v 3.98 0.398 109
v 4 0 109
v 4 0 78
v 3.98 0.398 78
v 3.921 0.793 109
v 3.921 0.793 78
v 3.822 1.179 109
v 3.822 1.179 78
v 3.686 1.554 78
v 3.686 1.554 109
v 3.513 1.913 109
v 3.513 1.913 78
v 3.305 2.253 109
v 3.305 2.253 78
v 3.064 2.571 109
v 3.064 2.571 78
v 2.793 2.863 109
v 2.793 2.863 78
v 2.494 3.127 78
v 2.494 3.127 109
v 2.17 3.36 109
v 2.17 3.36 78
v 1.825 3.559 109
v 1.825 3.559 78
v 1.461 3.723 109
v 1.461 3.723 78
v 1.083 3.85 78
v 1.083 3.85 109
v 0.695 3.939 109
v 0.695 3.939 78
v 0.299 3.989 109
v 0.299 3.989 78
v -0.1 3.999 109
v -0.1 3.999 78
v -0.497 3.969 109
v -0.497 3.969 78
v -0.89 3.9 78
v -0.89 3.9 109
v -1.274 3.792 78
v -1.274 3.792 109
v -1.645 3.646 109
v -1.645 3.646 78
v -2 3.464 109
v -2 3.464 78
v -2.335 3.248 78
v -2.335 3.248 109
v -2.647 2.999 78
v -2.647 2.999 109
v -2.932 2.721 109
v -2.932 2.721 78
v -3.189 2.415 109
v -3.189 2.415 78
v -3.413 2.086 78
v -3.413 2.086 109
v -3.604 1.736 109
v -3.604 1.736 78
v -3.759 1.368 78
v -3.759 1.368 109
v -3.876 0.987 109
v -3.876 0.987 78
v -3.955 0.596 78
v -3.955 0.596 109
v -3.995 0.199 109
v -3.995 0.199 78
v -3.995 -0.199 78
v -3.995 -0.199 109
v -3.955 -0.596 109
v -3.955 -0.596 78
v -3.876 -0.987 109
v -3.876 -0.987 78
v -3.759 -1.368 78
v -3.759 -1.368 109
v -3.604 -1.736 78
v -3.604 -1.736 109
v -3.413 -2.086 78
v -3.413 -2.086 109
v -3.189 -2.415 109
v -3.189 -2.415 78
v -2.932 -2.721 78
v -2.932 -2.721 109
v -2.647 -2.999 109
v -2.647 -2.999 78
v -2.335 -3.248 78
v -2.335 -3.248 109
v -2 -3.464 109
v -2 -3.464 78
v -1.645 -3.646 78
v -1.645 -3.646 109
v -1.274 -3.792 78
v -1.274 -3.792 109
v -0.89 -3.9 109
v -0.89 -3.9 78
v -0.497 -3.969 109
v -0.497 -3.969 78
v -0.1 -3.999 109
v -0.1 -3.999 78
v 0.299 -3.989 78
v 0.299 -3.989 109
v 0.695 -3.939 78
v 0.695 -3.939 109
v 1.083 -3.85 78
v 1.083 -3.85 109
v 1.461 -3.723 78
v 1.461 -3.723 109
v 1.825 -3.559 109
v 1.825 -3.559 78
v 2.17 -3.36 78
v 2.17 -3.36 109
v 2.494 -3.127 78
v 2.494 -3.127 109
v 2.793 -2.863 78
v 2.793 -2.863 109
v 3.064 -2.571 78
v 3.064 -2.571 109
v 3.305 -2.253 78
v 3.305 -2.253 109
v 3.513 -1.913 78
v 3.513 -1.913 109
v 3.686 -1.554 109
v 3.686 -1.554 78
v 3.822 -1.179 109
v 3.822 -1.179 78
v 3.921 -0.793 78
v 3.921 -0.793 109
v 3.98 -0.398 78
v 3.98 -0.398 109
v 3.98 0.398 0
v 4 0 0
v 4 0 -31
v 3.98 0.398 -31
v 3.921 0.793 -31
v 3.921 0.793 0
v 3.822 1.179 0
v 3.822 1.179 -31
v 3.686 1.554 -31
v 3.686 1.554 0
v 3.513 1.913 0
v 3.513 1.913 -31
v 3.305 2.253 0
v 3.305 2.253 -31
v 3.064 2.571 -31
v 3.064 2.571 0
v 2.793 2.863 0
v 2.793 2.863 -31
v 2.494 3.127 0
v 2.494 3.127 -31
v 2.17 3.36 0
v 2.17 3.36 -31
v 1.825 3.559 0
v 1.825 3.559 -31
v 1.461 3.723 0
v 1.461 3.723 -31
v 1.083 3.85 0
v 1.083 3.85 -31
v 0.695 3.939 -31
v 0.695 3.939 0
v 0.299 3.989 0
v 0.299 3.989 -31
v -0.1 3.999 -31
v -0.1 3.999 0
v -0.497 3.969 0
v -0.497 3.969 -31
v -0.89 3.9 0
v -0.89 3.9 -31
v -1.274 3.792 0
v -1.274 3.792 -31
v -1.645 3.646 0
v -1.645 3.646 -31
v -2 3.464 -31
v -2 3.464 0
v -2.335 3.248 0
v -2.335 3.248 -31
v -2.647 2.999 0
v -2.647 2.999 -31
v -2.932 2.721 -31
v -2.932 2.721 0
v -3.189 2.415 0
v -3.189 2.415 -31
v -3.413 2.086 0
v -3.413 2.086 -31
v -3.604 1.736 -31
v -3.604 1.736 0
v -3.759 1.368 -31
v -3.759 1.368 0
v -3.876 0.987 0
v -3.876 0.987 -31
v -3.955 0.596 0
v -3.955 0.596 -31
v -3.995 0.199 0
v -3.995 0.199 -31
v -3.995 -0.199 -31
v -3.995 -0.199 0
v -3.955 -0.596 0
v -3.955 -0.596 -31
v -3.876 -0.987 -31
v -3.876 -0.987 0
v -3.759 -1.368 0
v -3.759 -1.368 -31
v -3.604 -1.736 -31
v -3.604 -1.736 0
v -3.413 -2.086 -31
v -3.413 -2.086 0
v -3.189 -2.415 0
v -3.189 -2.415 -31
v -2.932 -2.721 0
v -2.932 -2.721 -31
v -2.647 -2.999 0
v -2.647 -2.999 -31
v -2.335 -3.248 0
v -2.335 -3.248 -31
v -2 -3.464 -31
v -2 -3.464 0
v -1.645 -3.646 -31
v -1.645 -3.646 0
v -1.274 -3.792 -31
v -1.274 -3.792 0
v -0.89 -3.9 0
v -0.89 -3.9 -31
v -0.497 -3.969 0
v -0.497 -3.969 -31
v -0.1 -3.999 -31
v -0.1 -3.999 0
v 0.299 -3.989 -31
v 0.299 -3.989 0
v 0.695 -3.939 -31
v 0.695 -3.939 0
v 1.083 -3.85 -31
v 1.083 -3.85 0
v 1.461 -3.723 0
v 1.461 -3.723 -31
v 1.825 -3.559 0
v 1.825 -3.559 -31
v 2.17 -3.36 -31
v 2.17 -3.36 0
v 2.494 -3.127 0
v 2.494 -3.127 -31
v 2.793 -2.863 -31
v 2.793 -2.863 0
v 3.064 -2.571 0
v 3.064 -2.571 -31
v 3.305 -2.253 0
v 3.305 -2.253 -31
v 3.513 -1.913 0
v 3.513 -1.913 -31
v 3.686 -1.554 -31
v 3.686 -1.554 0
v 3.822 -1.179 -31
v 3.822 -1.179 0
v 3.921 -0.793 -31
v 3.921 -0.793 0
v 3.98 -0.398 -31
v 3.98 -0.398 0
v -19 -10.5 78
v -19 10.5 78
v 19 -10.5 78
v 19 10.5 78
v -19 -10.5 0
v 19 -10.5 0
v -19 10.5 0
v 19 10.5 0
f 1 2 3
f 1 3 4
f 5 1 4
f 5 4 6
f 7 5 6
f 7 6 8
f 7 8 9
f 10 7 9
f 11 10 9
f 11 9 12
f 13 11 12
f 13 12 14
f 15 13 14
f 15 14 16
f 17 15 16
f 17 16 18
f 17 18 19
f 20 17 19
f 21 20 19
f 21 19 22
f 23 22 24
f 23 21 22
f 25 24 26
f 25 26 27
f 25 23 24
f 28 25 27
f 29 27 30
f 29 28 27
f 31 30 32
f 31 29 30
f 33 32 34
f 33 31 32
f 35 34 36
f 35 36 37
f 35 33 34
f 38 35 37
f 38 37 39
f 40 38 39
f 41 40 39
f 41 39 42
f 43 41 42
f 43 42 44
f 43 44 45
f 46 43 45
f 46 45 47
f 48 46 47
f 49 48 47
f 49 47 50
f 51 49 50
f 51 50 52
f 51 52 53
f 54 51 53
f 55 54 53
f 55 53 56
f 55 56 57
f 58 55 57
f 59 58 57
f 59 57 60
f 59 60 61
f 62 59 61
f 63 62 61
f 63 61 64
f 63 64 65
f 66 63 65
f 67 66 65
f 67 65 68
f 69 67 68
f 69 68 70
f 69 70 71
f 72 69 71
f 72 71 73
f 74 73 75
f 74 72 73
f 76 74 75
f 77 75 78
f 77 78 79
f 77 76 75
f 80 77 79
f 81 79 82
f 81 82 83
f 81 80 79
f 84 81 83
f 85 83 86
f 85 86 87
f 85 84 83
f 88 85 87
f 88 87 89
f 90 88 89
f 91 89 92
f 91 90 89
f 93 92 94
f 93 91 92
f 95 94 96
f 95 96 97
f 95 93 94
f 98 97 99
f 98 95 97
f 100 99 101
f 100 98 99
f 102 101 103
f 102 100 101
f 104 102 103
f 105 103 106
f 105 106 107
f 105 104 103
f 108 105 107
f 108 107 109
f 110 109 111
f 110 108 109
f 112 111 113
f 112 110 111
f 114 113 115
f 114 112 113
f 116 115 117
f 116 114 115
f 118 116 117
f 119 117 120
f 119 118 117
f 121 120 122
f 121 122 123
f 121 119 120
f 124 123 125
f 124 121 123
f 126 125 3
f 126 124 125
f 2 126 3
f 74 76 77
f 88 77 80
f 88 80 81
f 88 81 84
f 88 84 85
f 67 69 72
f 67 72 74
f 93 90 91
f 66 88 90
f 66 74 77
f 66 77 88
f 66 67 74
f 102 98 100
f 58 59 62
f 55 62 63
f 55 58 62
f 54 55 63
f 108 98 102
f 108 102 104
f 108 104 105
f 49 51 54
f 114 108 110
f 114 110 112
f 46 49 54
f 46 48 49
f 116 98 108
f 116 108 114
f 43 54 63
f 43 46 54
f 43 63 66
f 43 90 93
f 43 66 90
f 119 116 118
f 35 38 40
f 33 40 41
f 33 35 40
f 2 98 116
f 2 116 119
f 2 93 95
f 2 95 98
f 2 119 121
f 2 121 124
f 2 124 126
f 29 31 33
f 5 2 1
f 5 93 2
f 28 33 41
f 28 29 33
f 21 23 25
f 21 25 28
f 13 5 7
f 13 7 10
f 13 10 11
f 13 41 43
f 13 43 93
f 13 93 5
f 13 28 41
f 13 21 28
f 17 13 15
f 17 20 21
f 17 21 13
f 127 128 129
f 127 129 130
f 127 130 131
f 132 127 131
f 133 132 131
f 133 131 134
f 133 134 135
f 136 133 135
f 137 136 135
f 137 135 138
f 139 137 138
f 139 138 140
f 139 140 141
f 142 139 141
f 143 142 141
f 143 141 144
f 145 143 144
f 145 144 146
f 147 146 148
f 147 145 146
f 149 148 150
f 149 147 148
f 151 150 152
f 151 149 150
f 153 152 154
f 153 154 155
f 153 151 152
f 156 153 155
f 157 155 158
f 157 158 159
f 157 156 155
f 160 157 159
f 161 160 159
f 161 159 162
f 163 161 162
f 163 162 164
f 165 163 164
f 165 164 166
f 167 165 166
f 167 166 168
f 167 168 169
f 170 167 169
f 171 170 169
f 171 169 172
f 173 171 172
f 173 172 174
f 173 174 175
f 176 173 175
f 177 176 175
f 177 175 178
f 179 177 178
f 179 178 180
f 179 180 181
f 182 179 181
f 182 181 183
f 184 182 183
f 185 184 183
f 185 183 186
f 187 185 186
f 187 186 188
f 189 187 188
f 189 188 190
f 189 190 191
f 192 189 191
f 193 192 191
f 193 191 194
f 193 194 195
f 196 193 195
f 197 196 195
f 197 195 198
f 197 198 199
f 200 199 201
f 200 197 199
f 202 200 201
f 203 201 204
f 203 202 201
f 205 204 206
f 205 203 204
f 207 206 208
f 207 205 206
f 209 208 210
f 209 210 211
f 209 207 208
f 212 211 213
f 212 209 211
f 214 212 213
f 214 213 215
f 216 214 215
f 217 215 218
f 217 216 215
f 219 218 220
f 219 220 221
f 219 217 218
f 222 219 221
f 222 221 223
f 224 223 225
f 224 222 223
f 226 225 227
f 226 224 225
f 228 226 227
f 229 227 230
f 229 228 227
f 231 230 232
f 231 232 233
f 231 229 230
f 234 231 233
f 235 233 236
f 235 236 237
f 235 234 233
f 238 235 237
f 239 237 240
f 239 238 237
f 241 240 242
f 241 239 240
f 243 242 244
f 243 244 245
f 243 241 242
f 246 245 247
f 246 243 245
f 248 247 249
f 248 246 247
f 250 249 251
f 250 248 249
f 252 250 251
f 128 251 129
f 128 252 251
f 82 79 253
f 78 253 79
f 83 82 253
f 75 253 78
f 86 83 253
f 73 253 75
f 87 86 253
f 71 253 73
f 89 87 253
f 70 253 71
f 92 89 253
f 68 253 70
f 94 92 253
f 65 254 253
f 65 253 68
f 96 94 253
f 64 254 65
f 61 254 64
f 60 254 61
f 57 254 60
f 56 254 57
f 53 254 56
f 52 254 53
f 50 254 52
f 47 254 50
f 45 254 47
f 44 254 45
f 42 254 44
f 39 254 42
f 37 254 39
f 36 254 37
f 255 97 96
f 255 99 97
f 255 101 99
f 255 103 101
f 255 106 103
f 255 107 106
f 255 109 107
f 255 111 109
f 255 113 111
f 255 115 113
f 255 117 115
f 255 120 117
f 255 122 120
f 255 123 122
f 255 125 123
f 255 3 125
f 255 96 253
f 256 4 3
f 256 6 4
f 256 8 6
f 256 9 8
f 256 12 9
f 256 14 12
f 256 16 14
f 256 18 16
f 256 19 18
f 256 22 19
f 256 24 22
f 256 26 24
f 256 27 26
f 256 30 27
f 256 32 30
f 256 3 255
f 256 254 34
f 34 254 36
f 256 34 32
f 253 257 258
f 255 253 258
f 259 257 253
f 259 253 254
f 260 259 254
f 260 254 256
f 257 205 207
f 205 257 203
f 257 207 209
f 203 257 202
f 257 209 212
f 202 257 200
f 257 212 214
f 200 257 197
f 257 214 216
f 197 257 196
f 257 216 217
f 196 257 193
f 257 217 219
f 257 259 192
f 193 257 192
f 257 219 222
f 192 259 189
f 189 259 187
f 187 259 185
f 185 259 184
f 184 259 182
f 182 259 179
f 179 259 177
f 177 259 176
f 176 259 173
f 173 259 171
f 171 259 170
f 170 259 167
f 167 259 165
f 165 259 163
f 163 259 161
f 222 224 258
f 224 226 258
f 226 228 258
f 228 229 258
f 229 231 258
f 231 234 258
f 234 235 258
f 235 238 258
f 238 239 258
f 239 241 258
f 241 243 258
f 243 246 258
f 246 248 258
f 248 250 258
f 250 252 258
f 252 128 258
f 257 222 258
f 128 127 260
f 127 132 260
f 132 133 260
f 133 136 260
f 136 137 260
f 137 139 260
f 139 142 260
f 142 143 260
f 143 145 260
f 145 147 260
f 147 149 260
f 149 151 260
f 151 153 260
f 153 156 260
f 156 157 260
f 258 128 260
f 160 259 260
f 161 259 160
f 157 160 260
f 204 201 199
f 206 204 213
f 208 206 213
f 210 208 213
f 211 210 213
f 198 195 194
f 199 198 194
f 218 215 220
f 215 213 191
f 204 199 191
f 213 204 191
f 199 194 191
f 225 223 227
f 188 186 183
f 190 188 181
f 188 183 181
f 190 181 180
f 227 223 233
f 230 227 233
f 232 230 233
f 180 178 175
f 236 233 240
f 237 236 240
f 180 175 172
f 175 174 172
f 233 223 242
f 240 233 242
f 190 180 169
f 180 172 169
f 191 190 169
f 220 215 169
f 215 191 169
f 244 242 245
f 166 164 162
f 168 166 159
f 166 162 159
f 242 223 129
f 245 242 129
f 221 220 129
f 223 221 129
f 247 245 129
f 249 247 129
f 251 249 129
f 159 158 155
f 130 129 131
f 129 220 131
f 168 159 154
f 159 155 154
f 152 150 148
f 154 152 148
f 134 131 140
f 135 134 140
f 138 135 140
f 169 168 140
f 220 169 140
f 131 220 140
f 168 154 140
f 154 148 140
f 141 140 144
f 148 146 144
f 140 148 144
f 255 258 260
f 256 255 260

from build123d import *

# Parameters (mm, degrees)
SKETCH1_W           = 38
SKETCH1_H           = 21
BOSS_EXTRUDE1_DEPTH = 78
SKETCH2_R           = 4
CUT_EXTRUDE1_DEPTH  = 81.964498393
SKETCH3_R           = 4
BOSS_EXTRUDE2_DEPTH = 140


with BuildPart() as part:
    # Sketch1 → Boss-Extrude1 (new body)
    with BuildSketch(Plane.XY):
        Rectangle(SKETCH1_W, SKETCH1_H)
    extrude(amount=BOSS_EXTRUDE1_DEPTH)

    # Sketch2 → Cut-Extrude1 (cut, through all)
    with BuildSketch(Plane.XY.offset(78)):
        Circle(SKETCH2_R)
    extrude(amount=-CUT_EXTRUDE1_DEPTH, mode=Mode.SUBTRACT)

    # Sketch3 → Boss-Extrude2 (add)
    with BuildSketch(Plane.XY.offset(109)):
        Circle(SKETCH3_R)
    extrude(amount=-BOSS_EXTRUDE2_DEPTH)


solid = part.part
